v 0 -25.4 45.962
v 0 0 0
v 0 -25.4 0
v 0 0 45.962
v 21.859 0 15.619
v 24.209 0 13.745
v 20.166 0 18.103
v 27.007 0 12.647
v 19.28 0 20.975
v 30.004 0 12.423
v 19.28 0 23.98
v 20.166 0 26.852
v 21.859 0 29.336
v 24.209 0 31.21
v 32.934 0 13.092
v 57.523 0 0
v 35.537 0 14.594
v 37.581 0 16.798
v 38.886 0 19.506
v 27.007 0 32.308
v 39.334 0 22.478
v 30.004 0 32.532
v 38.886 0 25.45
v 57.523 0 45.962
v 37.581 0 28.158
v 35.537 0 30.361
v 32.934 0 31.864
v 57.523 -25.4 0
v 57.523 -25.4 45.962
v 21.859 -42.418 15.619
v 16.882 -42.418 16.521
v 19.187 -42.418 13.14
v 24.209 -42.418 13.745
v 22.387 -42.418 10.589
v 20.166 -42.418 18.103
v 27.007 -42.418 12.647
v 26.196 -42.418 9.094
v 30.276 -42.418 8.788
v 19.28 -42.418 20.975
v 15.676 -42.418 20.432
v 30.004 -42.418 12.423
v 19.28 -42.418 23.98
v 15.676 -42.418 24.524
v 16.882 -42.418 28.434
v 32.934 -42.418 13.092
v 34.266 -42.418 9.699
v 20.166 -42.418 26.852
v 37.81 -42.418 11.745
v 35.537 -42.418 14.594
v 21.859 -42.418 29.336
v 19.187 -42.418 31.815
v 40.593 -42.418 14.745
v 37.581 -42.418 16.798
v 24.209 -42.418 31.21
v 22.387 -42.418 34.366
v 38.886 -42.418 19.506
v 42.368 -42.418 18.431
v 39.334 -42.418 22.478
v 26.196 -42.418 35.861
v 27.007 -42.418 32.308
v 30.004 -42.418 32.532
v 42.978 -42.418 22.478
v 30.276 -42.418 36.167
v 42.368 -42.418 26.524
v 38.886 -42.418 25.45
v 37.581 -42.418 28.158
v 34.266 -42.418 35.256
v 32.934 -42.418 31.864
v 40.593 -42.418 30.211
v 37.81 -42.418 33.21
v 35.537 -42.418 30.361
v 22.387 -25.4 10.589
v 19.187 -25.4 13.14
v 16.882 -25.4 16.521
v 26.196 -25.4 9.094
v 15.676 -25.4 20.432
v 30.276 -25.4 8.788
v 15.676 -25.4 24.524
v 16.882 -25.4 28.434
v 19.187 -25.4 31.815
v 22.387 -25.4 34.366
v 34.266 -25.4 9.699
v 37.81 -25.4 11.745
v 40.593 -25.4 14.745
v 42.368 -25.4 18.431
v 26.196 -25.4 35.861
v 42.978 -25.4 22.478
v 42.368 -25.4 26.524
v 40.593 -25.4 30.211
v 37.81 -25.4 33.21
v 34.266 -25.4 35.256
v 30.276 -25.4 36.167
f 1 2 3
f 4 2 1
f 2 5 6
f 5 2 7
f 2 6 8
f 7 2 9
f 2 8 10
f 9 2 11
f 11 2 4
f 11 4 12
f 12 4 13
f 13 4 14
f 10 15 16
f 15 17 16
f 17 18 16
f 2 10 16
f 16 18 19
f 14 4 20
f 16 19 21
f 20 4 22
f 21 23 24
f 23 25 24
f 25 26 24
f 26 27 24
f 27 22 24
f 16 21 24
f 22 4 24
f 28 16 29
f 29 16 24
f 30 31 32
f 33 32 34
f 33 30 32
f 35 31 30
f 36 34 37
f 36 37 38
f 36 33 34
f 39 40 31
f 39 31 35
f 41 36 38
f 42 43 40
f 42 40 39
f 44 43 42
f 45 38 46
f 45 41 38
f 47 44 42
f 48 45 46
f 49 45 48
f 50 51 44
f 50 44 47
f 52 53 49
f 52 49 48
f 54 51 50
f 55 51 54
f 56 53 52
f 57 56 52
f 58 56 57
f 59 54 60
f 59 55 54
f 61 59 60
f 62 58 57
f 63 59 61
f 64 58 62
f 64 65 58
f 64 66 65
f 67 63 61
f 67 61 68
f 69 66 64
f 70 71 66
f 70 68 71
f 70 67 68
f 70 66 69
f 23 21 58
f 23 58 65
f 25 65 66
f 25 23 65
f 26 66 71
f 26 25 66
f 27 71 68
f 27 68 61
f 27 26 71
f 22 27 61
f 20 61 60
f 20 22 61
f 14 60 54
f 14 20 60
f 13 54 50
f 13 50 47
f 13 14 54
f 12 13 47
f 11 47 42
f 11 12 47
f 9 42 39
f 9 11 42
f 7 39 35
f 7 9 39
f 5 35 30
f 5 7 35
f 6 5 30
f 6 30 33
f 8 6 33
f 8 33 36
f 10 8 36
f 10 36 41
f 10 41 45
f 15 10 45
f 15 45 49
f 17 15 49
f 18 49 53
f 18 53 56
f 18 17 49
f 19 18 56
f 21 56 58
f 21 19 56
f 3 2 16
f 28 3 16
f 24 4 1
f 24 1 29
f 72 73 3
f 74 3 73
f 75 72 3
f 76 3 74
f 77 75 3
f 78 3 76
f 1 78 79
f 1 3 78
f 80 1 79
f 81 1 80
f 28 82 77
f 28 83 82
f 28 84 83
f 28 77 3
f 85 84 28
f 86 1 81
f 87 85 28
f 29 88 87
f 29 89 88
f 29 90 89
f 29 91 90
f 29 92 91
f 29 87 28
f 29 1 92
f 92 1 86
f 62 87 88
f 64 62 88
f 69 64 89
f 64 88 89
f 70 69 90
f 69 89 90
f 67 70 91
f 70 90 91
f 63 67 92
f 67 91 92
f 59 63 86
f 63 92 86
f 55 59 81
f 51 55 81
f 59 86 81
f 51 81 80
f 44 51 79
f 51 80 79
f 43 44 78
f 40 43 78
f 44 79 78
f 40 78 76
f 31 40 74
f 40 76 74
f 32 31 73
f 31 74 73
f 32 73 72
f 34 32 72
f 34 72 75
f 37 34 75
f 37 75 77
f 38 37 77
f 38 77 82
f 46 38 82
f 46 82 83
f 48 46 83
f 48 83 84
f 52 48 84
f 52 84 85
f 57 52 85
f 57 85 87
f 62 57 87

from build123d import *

# Parameters (mm, degrees)
F0_W     = 57.522915
F0_H     = 45.961969
F0_R     = 13.727632
F1_DEPTH = 25.4
F2_DEPTH = 25.4
F0_R_2   = 10.083069
F3_DEPTH = 42.418


with BuildPart() as f1:
    # F0 (on Front) → F1 (new body)
    with BuildSketch(Plane.XZ):
        with Locations((28.761457, 22.980984)):
            Rectangle(F0_W, F0_H)
        with Locations((29.250471, 22.477599)):
            Circle(F0_R, mode=Mode.SUBTRACT)
    extrude(amount=F1_DEPTH)

    # F0 (on Front) → F2 (join)
    with BuildSketch(Plane.XZ):
        with Locations((28.761457, 22.980984)):
            Rectangle(F0_W, F0_H)
        with Locations((29.250471, 22.477599)):
            Circle(F0_R, mode=Mode.SUBTRACT)
    extrude(amount=F2_DEPTH)

    # F0 (on Front) → F3 (join)
    with BuildSketch(Plane.XZ):
        with Locations((29.250471, 22.477599)):
            Circle(F0_R)
        with Locations((29.250471, 22.477599)):
            Circle(F0_R_2, mode=Mode.SUBTRACT)
    extrude(amount=F3_DEPTH)


solid = f1.part
